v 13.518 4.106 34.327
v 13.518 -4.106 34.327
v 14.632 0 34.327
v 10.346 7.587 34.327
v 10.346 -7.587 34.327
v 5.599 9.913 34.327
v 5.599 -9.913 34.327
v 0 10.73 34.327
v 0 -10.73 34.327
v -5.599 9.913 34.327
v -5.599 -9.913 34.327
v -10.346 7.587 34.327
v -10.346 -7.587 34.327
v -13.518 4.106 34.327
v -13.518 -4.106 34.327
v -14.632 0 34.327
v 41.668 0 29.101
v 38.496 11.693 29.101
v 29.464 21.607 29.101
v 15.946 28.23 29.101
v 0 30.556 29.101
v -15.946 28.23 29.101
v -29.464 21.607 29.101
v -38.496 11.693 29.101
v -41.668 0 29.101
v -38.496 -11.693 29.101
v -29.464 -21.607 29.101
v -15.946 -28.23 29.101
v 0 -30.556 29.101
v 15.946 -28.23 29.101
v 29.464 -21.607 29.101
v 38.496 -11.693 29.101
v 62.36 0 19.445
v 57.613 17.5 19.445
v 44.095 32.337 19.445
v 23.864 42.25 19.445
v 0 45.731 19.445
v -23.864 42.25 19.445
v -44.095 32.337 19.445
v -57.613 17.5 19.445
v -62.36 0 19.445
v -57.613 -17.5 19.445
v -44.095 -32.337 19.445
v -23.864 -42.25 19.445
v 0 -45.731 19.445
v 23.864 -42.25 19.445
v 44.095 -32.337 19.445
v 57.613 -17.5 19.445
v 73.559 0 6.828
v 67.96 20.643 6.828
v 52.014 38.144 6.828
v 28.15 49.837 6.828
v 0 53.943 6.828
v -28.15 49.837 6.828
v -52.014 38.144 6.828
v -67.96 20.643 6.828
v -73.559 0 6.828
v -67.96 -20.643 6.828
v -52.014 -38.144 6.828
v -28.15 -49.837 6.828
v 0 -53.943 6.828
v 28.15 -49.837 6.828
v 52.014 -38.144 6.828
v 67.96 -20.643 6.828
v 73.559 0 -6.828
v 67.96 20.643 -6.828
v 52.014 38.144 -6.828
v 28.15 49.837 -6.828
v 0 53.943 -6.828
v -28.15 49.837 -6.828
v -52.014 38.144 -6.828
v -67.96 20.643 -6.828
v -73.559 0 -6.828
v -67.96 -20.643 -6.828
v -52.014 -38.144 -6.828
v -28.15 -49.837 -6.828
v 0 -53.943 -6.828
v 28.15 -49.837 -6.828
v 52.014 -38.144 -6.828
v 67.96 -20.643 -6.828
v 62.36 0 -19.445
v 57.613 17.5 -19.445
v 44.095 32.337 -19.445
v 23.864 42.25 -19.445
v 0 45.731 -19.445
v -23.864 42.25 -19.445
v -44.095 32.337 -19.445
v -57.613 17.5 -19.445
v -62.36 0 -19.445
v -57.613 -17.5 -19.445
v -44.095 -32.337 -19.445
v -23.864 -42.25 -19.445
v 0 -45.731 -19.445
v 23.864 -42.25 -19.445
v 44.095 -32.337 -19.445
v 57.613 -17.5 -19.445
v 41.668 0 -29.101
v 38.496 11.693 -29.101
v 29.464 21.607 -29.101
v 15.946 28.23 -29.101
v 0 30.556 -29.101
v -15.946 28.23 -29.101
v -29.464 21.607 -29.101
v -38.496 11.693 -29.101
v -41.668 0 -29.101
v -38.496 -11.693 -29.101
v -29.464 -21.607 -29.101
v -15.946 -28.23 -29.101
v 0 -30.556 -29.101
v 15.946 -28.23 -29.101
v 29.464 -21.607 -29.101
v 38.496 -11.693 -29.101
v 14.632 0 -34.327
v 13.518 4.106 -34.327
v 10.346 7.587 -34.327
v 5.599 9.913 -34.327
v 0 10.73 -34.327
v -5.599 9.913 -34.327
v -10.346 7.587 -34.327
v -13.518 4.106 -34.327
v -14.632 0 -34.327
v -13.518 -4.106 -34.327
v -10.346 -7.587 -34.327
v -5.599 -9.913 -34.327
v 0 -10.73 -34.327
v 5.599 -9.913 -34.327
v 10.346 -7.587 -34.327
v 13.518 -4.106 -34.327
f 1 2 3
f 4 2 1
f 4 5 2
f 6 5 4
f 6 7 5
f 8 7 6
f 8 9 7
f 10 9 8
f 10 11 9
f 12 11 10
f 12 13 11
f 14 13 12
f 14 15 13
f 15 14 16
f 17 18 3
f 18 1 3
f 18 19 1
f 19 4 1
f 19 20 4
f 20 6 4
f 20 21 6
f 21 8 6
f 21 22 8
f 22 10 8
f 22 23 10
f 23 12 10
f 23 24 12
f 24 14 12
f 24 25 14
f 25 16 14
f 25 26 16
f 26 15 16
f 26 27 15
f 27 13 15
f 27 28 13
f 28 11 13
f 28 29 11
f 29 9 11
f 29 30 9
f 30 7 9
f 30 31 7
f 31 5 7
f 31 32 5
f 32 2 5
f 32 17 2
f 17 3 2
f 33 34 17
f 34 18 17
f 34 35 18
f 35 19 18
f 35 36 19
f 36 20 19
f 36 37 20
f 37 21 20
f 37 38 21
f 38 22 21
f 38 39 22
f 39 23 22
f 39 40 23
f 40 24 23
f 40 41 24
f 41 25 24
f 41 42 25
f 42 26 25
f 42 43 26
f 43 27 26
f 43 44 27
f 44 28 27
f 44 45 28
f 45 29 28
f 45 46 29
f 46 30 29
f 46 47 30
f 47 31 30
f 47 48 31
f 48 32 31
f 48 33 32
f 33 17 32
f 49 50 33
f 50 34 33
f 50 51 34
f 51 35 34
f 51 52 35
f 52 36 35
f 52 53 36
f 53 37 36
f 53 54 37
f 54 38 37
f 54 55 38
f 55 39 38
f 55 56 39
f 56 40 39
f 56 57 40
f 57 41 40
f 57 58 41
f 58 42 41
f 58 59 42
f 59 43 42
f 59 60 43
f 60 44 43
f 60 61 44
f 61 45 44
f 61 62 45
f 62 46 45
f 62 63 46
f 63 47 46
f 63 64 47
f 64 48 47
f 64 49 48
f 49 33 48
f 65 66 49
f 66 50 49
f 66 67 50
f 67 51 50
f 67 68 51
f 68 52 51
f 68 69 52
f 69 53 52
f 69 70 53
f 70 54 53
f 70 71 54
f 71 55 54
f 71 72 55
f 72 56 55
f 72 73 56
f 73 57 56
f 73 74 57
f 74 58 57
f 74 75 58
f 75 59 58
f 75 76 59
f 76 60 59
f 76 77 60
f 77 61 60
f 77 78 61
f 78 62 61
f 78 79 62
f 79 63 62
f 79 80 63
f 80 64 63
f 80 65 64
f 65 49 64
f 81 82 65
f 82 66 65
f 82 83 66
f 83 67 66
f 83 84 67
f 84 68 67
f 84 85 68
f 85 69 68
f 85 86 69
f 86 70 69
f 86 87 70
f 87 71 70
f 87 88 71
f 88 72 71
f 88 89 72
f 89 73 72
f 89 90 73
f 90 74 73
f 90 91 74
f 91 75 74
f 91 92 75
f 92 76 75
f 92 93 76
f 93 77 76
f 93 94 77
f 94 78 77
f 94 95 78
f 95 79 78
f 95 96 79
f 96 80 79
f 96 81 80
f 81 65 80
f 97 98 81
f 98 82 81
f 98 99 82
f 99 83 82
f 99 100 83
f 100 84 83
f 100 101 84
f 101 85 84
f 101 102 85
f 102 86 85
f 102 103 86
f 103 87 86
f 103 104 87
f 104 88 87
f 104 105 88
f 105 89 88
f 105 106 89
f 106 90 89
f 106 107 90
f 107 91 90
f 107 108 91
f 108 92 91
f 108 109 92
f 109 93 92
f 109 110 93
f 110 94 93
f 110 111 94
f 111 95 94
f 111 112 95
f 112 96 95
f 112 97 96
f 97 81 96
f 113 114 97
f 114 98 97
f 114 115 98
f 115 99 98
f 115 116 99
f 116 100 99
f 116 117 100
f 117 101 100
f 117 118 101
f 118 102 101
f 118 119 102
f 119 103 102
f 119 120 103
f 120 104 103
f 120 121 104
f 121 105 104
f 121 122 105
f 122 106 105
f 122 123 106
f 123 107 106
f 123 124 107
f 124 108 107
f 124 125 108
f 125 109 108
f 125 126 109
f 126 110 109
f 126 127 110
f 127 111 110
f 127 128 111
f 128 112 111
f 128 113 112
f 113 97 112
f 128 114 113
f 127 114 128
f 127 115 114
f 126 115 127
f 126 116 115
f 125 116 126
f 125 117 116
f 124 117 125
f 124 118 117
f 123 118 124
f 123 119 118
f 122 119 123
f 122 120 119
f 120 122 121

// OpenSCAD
// Generated by SolidPython 1.0.1 on 2020-07-29 00:46:52


scale(v = [15, 11, 7]) {
	sphere(r = 5);
}
/***********************************************
*********      SolidPython code:      **********
************************************************
 
# import packages: SolidPython
from solid import *
from solid.utils import *
from itertools import chain, combinations, permutations


class Resize:

    def __init__(self, scad_file):
        self.scad_file = scad_file
        #self.scad_file = import_scad(scad_file)
        # cone/cylinder param:
        self.r1 = 0
        self.r2 = 0
        self.h = 0
        # rectangular prism param:
        self.w = 0
        self.l = 0
        # ellipse param:
        self.r = 0

    # import OpenScad code (file name corresponds to shape)


    # classify shape + parameters
    def assign(self, param1, param2, param3):
        if self.scad_file == 'cone.scad':
            self.r1 = param1
            self.r2 = param2
            self.h = param3
        elif self.scad_file == 'cylinder.scad':
            self.r1 = param1
            self.r2 = param2
            self.h = param3
        elif self.scad_file == 'rectangularPrism.scad':
            self.h = param1
            self.l = param2
            self.w = param3
        else:
            self.r = param1
            self.h = param2

    # resize parameters
    def iterate(self):
        x = range(3, 20, 2)
        i = 1
        if self.scad_file == 'cone.scad':
            tempList = list(permutations(x, 2))
            for temp in tempList:
                param1 = temp[0]
                param2 = temp[1]
                filepath = 'produced_scad_files/' + 'cone' + str(param1) + '_' + str(param2) + '_' + '.scad'
                scad_render_to_file(cylinder(h=param1, r1=param2, r2=0), filepath)

        elif self.scad_file == 'cylinder.scad':
            tempList = list(permutations(x, 3))
            for temp in tempList:
                param1 = temp[0]
                param2 = temp[1]
                filepath = 'produced_scad_files/' + 'cylinder' + str(param1) + '_' + str(param2) + '_' + '.scad'
                scad_render_to_file(cylinder(h=param1, r1=param2, r2=param2), filepath)

        elif self.scad_file == 'rectangularPrism.scad':
            tempList = list(permutations(x, 3))
            for temp in tempList:
                param1 = temp[0]
                param2 = temp[1]
                param3 = temp[2]
                filepath = 'produced_scad_files/' + 'rectangularPrism' + str(param1) + '_' + str(param2) + '_' + str(
                    param3) + '.scad'
                scad_render_to_file(cube(size=(param1, param2, param3)), filepath)

        elif self.scad_file == 'ellipse.scad':
            tempList = list(permutations(x, 4))
            for temp in tempList:
                param1 = temp[0]
                param2 = temp[1]
                param3 = temp[2]
                param4 = temp[3]
                filepath = 'produced_scad_files/' + 'ellipse' + str(param1) + '_' + str(param2) + '_' + str(param3) + '_' + str(param4) + '.scad'
                scad_render_to_file(scale([param1, param2, param3])(sphere(r=param4)), filepath)

    def render_to_scadfile(self):
        scad_render_to_file(scad, 'example.scad') 
 
************************************************/
